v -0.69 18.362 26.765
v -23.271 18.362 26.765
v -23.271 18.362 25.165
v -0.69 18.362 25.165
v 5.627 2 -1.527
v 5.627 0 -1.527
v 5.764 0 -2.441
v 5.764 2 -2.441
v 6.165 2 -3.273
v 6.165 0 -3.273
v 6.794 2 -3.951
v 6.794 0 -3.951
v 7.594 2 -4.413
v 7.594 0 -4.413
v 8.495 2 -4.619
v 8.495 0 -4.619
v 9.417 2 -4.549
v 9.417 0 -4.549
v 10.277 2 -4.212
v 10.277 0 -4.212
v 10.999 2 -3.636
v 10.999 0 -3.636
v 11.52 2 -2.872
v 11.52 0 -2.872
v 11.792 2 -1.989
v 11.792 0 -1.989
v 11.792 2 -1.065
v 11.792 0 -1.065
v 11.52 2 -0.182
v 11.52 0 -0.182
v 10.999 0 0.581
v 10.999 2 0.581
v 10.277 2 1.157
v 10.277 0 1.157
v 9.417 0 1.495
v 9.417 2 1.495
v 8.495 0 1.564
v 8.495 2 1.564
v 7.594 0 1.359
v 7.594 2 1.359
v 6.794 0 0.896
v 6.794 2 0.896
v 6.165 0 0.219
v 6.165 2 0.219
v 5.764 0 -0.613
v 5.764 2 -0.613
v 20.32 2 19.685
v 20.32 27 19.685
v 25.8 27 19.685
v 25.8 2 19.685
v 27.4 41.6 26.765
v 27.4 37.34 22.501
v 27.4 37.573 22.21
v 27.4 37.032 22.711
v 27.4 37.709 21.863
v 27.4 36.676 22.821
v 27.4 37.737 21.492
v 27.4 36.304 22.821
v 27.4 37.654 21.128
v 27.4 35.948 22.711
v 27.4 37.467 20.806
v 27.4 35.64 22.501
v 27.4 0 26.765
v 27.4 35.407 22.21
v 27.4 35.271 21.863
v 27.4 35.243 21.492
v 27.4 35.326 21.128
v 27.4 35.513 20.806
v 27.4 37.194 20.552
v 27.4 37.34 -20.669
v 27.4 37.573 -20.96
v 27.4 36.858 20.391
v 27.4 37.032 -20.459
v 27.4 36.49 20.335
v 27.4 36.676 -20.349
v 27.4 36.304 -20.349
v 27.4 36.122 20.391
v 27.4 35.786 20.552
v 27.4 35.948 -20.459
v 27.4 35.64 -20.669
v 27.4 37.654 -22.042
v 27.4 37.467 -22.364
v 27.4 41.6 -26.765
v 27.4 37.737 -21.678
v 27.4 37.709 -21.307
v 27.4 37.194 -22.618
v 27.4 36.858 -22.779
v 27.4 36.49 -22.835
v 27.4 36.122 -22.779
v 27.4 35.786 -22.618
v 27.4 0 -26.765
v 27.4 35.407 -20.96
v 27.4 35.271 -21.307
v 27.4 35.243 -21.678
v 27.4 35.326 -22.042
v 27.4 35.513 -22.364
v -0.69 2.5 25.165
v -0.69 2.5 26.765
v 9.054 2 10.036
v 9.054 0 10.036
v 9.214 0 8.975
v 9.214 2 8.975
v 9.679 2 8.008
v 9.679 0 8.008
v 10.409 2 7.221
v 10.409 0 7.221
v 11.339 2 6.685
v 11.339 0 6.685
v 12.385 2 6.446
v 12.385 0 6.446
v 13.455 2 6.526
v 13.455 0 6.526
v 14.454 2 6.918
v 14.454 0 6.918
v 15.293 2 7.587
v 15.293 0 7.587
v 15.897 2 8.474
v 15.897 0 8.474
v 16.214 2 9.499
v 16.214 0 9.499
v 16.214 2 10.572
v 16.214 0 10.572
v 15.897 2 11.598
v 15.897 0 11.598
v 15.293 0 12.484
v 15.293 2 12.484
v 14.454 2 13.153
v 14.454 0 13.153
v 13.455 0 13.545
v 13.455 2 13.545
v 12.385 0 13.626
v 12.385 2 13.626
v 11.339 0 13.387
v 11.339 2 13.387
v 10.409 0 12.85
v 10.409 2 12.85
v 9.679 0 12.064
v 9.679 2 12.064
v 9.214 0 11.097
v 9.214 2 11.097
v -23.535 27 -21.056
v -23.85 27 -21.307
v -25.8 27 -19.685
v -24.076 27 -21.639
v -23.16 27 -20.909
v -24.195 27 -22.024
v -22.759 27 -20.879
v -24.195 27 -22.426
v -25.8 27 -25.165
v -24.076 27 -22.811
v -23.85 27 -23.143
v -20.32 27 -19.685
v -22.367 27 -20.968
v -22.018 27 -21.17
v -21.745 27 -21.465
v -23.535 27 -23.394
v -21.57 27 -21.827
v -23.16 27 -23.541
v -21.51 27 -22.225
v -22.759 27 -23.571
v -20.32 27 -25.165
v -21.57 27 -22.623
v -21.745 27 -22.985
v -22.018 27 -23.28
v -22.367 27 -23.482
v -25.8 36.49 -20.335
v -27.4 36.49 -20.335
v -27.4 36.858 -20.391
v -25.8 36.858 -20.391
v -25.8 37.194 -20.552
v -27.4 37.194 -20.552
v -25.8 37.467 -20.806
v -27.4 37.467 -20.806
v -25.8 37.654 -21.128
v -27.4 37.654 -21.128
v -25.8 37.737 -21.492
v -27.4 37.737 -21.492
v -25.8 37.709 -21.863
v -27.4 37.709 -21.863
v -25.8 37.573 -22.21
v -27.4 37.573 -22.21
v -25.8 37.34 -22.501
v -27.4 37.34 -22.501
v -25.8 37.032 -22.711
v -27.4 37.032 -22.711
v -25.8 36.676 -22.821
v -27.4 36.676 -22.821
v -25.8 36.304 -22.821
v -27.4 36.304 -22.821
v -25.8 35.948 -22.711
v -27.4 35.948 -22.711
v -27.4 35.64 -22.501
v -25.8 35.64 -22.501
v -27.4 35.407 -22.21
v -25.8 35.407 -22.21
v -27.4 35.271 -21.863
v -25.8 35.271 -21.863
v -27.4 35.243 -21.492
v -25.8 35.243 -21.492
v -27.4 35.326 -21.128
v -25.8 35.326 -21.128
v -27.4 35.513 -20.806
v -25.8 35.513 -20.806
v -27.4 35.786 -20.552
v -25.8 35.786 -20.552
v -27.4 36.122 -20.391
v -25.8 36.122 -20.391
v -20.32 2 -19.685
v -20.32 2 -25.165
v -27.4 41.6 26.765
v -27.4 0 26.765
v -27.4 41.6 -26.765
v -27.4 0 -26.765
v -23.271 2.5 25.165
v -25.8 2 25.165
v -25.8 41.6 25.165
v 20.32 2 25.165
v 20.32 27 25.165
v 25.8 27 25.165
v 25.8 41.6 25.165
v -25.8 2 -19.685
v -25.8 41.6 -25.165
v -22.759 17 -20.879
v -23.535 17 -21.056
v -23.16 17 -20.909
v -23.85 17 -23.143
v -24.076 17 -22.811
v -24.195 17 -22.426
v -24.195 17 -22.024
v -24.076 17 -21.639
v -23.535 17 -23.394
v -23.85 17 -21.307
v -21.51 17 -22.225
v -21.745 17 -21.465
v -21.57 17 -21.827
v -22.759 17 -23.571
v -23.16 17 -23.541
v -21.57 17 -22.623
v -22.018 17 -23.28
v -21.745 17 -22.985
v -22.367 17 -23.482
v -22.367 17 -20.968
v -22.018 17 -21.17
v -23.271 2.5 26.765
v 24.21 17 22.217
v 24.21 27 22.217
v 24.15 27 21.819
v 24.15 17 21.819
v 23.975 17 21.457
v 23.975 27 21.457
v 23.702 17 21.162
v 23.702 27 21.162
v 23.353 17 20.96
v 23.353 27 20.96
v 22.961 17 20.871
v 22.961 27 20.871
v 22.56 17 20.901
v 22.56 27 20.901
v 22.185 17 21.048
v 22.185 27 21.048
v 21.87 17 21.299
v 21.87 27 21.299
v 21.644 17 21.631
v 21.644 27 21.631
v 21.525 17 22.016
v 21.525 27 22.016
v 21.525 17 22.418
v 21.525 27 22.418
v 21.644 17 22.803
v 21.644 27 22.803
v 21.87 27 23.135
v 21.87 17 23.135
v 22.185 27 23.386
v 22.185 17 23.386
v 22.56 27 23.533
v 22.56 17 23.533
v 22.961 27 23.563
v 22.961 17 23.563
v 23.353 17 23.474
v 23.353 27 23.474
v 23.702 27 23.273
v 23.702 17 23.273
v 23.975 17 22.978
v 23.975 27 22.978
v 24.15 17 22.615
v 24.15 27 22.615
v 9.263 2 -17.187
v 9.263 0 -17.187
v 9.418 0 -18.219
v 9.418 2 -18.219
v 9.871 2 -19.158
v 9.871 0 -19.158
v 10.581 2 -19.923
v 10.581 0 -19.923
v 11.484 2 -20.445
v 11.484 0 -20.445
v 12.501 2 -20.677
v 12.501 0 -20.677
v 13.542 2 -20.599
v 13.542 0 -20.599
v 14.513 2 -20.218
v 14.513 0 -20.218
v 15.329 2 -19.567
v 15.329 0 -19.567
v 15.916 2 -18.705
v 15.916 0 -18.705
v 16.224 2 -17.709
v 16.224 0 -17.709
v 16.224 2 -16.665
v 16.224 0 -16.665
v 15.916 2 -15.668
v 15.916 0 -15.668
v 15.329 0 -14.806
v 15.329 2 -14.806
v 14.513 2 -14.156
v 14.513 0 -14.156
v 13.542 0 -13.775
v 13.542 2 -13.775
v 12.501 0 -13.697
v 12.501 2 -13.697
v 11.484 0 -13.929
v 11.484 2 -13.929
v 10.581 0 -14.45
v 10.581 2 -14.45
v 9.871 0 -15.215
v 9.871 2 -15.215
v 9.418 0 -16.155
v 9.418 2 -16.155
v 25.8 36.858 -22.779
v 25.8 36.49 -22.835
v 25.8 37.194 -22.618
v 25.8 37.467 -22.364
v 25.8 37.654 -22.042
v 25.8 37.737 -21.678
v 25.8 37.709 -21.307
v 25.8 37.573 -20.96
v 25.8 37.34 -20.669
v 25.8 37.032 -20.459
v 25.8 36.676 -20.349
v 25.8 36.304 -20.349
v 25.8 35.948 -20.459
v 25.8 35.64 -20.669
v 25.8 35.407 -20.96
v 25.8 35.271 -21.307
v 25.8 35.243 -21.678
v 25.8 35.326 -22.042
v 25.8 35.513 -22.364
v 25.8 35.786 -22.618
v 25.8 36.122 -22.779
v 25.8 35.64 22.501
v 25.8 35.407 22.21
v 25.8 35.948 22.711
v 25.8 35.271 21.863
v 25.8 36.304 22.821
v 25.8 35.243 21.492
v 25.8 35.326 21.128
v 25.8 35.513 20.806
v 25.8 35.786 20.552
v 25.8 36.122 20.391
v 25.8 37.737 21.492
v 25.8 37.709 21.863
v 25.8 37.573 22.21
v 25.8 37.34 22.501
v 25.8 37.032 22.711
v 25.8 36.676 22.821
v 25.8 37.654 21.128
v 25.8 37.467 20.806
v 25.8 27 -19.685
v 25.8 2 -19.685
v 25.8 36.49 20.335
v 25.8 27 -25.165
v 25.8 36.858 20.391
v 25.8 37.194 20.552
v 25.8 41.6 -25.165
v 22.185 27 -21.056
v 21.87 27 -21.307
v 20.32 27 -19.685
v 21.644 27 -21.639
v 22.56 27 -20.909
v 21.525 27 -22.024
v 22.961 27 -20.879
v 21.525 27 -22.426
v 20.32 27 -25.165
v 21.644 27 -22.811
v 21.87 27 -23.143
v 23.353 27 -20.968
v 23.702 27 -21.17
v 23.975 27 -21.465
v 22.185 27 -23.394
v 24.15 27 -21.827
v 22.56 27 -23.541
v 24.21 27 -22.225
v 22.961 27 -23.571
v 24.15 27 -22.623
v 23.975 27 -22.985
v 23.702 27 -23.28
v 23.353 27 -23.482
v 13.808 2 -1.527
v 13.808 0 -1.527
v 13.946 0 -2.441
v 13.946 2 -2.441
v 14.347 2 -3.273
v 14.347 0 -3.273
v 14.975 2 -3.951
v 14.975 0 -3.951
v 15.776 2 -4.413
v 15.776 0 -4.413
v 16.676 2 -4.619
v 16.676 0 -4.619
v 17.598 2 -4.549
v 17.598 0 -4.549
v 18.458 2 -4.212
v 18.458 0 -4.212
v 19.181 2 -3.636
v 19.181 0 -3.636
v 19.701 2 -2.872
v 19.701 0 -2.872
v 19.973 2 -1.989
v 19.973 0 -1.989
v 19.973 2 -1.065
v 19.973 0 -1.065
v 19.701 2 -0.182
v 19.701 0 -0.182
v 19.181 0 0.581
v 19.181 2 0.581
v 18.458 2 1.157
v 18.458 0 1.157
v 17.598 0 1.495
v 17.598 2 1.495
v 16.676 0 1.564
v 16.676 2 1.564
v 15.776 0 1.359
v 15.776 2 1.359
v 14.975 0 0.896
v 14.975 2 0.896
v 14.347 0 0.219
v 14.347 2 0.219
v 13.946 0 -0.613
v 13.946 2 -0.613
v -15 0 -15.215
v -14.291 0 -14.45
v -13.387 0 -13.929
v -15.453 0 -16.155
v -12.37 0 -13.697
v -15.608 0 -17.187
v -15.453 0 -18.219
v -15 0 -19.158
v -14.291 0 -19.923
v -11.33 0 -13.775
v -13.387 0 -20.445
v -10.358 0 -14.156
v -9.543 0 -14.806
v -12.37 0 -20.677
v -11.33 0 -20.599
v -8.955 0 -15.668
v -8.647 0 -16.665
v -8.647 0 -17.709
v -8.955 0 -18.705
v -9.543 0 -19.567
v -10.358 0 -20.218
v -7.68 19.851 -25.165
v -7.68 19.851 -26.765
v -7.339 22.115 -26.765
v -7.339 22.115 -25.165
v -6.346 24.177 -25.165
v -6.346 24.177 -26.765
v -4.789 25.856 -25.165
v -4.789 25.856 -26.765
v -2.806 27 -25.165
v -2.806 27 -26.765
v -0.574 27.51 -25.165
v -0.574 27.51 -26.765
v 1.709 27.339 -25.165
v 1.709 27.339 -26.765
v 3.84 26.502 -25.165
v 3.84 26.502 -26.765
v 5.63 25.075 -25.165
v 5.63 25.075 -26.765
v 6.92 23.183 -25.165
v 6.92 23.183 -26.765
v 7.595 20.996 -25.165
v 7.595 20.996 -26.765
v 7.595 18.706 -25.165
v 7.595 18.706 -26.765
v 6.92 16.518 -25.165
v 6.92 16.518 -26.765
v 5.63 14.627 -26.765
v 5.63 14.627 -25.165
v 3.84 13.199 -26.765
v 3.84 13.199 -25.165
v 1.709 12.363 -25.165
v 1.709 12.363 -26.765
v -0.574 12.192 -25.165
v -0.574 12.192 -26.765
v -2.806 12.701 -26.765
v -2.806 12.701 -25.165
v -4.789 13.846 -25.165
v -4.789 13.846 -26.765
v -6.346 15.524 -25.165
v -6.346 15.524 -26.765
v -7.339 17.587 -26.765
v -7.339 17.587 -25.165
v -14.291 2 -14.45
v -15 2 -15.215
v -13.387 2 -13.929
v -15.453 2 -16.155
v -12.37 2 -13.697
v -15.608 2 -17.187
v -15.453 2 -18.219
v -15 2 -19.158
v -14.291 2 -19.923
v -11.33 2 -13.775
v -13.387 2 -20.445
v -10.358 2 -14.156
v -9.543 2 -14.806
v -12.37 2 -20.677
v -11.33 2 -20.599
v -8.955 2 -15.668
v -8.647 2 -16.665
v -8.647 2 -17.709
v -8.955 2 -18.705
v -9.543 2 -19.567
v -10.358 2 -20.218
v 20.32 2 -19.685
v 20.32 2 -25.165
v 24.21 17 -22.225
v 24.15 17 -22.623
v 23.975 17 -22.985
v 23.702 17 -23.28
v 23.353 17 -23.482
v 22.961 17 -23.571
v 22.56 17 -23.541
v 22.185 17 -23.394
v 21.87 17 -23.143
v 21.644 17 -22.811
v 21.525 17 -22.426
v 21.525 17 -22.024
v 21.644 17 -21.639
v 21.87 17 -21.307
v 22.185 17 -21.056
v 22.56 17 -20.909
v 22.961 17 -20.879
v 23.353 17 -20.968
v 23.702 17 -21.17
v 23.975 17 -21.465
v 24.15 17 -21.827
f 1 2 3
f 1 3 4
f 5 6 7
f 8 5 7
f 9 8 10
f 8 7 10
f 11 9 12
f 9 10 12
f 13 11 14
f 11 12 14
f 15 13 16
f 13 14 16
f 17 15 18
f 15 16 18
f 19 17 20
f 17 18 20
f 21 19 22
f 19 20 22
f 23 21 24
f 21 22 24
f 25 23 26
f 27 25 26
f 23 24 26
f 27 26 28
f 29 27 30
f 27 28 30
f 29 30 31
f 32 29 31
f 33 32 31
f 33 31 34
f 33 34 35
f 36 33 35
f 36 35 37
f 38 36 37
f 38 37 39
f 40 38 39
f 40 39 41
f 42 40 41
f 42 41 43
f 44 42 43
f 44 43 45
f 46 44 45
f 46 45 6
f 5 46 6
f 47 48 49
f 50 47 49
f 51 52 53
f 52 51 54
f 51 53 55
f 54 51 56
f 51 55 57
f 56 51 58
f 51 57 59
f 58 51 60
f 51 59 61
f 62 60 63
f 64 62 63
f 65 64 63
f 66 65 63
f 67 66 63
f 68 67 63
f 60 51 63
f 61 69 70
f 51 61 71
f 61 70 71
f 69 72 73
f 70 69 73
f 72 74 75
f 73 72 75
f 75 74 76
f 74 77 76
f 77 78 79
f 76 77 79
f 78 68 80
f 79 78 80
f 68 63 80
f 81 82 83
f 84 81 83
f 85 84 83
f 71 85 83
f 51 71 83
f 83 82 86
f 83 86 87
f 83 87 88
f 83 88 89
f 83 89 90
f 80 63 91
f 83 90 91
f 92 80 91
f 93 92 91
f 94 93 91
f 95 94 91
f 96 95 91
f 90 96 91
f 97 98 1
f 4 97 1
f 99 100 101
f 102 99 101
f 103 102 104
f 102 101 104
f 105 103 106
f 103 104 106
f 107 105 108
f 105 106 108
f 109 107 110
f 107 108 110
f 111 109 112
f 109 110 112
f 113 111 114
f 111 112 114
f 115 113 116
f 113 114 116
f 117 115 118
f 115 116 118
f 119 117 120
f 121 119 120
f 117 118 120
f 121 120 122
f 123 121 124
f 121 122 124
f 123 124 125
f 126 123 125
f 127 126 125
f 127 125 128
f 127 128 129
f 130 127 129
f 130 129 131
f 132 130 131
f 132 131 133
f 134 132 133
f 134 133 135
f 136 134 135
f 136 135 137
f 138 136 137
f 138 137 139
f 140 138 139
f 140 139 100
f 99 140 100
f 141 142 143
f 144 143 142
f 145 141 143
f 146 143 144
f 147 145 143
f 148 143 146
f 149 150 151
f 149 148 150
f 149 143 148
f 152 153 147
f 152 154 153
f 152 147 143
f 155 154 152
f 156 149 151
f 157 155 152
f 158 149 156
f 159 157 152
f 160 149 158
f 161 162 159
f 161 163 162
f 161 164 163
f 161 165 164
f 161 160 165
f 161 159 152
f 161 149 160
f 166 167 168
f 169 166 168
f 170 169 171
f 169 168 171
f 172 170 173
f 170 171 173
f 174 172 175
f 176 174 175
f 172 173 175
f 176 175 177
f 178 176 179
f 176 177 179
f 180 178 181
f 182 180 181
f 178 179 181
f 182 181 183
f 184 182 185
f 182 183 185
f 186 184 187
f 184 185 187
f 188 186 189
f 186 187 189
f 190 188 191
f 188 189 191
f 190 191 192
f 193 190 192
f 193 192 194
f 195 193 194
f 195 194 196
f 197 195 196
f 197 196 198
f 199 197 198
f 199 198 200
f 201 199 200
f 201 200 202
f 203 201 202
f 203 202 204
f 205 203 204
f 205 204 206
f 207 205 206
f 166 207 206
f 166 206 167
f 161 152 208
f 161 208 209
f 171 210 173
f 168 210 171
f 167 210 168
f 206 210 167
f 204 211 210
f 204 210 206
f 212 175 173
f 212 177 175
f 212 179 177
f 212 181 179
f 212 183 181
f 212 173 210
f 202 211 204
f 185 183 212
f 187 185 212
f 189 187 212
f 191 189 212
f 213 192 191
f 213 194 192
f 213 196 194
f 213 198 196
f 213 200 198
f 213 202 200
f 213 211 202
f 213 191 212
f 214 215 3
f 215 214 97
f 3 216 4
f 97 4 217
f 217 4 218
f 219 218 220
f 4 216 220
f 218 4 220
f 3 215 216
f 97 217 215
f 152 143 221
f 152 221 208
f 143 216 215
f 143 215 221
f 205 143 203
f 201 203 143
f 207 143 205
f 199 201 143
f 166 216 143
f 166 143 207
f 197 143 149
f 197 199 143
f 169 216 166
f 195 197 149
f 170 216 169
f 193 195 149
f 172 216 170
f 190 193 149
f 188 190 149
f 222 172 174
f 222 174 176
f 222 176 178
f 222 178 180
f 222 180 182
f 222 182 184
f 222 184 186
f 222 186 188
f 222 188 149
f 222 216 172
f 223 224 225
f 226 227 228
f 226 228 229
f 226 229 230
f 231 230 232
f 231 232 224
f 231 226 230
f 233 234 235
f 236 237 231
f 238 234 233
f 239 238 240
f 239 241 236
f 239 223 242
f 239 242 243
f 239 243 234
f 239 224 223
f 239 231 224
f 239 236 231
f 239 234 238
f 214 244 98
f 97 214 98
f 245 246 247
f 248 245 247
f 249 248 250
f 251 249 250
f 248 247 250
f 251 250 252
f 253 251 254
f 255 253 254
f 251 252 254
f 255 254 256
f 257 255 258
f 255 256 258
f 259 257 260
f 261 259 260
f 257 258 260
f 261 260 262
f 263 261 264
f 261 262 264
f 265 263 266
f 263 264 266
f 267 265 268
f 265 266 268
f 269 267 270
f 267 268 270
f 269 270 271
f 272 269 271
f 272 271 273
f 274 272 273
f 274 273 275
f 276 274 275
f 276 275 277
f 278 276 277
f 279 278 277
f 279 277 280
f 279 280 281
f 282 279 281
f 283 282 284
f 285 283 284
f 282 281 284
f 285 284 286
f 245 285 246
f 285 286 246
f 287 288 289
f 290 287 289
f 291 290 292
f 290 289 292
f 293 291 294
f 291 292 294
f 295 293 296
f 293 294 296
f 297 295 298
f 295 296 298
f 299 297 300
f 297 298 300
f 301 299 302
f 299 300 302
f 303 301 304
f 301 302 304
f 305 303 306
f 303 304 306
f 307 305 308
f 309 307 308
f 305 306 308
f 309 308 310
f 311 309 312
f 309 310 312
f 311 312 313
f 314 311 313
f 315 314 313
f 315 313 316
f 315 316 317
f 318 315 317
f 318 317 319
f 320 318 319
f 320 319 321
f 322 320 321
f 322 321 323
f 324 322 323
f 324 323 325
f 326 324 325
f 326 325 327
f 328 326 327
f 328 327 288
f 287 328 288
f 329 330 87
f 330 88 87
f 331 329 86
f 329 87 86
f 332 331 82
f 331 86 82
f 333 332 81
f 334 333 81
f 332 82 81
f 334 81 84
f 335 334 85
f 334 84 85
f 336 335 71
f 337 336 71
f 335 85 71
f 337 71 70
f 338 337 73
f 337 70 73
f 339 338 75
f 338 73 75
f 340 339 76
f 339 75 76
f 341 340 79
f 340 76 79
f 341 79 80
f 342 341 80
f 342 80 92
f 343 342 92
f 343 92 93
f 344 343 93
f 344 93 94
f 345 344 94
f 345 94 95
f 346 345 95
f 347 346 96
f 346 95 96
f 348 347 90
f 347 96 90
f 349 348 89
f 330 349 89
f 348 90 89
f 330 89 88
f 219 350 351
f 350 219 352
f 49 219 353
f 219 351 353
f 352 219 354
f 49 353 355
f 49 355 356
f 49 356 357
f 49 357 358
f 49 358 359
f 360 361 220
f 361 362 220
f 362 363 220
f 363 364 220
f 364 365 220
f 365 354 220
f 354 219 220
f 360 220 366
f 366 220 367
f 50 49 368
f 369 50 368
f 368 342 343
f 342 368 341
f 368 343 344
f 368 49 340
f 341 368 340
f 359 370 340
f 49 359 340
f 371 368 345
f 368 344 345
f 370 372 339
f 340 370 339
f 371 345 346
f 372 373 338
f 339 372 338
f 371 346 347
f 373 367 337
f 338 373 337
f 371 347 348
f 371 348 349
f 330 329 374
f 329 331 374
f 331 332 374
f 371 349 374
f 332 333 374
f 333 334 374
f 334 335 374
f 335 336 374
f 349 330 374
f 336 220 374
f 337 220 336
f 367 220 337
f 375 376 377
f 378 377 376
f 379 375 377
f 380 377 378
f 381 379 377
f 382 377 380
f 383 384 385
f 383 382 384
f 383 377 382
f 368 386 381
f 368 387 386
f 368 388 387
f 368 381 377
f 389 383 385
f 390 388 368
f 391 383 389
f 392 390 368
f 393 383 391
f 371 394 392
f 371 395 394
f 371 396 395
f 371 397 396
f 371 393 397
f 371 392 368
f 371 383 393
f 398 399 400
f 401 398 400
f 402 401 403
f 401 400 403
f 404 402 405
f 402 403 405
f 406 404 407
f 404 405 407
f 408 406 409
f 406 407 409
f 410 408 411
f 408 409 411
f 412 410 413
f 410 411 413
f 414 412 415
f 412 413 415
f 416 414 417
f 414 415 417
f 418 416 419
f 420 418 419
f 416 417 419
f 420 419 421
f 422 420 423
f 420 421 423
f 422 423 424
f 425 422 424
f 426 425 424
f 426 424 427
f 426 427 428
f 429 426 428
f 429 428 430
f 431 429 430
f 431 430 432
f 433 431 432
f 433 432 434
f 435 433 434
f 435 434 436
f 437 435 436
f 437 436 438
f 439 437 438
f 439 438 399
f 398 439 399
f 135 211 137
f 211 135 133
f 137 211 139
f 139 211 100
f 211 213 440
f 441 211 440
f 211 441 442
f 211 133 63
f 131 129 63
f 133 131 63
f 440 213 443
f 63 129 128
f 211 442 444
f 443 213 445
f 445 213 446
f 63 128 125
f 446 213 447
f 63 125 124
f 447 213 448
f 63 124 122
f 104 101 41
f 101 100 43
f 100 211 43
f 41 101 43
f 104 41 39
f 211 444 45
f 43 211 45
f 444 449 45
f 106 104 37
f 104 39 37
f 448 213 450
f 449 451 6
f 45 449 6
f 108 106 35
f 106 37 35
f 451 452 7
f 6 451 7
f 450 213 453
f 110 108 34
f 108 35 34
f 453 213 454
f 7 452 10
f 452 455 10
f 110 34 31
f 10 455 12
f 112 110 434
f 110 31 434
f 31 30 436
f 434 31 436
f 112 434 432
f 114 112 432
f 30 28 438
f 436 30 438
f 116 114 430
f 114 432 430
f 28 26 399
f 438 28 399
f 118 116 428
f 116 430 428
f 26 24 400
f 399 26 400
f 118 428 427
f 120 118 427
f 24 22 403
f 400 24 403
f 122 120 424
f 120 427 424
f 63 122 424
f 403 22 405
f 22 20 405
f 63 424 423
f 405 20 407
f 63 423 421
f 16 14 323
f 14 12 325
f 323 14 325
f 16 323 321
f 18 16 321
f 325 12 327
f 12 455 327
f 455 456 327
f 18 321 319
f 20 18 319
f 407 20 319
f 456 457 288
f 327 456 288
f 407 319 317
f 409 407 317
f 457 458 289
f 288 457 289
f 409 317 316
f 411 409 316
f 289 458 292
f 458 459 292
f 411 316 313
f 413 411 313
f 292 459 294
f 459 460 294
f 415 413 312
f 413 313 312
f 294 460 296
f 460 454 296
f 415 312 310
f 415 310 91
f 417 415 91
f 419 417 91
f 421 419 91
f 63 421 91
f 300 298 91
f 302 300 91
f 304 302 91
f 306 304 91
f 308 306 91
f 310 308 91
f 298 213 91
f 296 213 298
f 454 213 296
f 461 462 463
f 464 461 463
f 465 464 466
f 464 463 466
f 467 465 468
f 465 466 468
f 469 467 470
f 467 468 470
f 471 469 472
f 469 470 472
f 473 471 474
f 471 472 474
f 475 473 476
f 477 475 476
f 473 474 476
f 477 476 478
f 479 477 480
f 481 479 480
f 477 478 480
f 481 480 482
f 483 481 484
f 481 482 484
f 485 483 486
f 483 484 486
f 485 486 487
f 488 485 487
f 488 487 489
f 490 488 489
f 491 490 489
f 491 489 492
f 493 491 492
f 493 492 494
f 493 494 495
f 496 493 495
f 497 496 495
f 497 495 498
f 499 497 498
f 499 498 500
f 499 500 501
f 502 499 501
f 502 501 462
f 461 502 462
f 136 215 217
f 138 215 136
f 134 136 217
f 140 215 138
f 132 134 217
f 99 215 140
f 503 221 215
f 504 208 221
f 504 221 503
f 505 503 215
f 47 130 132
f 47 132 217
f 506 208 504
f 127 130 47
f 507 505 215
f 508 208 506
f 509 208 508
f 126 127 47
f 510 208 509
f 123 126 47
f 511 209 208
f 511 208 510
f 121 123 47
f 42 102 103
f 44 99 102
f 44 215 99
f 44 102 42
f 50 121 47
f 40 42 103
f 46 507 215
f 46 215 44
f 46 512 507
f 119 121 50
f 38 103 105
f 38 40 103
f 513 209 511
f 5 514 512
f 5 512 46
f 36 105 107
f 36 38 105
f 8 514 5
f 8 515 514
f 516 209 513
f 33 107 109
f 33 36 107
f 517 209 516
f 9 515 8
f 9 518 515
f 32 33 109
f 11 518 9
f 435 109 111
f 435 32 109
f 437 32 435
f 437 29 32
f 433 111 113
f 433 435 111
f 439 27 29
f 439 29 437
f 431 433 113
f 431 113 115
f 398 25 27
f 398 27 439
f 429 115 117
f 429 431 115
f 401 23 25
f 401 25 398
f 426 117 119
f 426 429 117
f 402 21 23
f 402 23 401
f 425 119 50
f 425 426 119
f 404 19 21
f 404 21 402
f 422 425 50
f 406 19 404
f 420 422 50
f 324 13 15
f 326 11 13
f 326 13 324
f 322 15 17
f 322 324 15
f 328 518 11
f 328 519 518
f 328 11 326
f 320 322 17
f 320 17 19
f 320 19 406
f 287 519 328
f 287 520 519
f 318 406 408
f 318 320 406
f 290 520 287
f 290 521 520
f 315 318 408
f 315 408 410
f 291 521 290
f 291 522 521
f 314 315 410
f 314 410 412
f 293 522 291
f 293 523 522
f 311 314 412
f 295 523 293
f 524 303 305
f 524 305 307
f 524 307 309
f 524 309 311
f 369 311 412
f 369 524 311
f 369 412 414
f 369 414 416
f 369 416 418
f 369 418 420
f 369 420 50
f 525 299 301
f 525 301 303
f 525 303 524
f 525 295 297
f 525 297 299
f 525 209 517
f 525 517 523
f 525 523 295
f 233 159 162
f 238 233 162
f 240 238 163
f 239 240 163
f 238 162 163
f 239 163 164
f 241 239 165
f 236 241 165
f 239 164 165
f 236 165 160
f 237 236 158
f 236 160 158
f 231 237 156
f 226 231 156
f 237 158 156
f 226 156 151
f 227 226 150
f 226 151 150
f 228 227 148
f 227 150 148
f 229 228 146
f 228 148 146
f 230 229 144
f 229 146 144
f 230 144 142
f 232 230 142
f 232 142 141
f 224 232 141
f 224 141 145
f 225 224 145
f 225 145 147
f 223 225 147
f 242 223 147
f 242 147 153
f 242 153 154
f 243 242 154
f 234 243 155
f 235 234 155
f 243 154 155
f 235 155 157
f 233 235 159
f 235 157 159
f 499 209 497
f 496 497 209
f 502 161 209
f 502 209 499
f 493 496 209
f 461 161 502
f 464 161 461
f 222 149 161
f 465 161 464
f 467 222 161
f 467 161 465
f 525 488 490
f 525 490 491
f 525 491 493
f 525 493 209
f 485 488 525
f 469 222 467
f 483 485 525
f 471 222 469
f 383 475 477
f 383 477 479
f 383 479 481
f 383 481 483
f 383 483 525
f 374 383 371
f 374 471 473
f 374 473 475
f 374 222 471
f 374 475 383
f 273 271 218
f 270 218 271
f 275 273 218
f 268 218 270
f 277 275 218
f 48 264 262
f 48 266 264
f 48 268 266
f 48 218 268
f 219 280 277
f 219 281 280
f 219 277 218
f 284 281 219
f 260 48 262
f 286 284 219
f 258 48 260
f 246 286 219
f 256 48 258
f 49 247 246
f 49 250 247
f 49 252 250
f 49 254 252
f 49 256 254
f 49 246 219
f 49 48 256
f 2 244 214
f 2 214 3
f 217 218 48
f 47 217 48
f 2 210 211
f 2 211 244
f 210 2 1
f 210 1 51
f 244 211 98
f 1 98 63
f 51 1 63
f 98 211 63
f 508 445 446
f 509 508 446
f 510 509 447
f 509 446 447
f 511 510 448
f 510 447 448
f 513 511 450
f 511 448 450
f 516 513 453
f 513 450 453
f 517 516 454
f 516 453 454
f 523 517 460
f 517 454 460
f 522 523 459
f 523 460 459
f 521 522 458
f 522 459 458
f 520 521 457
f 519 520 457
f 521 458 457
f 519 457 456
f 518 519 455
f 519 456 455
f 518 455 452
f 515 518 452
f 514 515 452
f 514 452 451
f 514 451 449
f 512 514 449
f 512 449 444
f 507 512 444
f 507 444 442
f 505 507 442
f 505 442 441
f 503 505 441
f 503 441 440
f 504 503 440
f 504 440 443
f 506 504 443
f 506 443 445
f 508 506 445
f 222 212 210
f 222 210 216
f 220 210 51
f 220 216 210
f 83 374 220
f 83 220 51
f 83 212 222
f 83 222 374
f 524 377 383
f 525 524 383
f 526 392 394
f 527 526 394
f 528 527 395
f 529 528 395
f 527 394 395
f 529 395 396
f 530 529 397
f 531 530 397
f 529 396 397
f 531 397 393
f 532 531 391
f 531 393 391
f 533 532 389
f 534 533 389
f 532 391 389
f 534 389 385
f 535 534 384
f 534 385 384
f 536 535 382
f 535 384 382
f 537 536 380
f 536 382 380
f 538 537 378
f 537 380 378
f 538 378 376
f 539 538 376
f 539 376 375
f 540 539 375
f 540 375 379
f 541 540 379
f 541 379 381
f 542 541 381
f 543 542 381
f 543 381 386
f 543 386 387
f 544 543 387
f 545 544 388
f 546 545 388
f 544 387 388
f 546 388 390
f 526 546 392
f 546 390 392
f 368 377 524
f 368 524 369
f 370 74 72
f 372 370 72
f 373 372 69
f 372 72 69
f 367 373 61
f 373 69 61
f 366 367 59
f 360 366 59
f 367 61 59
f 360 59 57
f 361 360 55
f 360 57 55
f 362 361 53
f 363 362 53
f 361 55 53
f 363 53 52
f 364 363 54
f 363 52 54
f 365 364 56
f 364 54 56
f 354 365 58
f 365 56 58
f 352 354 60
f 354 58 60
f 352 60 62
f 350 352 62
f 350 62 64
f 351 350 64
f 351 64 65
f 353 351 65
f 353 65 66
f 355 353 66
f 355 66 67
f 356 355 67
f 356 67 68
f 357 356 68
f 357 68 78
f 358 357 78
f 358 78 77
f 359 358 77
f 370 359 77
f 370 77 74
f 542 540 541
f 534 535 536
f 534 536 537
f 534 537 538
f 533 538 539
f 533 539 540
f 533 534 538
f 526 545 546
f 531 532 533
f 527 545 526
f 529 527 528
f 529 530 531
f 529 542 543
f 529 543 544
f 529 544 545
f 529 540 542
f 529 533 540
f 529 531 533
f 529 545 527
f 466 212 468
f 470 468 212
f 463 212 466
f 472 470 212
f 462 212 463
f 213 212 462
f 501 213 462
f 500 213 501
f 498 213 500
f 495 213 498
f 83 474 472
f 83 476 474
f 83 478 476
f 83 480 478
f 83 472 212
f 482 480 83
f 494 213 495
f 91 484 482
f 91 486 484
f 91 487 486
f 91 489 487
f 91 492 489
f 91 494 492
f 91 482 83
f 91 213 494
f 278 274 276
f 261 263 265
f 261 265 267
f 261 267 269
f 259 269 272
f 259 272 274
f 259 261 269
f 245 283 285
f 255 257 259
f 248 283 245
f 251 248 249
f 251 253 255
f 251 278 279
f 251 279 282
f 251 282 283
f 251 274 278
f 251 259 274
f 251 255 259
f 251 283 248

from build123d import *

# Parameters (mm, degrees)
SKETCH1_W           = 54.8
SKETCH1_H           = 53.53
BOSS_EXTRUDE1_DEPTH = 41.6
SKETCH2_W           = 51.6
SKETCH2_H           = 50.33
CUT_EXTRUDE1_DEPTH  = 39.6
SKETCH3_W           = 5.48
SKETCH3_H           = 5.48
BOSS_EXTRUDE2_DEPTH = 25
SKETCH4_R           = 1.35
CUT_EXTRUDE2_DEPTH  = 10
CUT_EXTRUDE3_REACH  = 43.6
SKETCH5_R           = 3.5
CUT_EXTRUDE4_REACH  = 43.6
SKETCH6_R           = 3.1
CUT_EXTRUDE5_REACH  = 43.6
SKETCH7_R           = 3.6
CUT_EXTRUDE6_REACH  = 56.8
SKETCH8_R           = 1.25
CUT_EXTRUDE7_REACH  = 56.8
SKETCH10_R          = 1.25
CUT_EXTRUDE8_REACH  = 55.53
SKETCH12_R          = 7.680495542
CUT_EXTRUDE9_REACH  = 55.53
SKETCH13_W          = 22.581735489
SKETCH13_H          = 15.862362247
CUT_EXTRUDE10_REACH = 56.8
SKETCH14_R          = 1.25


with BuildPart() as part:
    # Sketch1 → Boss-Extrude1 (new body)
    with BuildSketch(Plane(origin=(0, 0, 0), x_dir=(1, 0, 0), z_dir=(0, 1, 0))):
        Rectangle(SKETCH1_W, SKETCH1_H)
    extrude(amount=BOSS_EXTRUDE1_DEPTH)

    # Sketch2 → Cut-Extrude1 (cut)
    with BuildSketch(Plane(origin=(0, 41.6, 0), x_dir=(1, 0, 0), z_dir=(0, 1, 0))):
        Rectangle(SKETCH2_W, SKETCH2_H)
    extrude(amount=-CUT_EXTRUDE1_DEPTH, mode=Mode.SUBTRACT)

    # Sketch3 → Boss-Extrude2 (add)
    with BuildSketch(Plane(origin=(0, 2, 0), x_dir=(1, 0, 0), z_dir=(0, 1, 0))):
        with Locations((-23.06, 22.425)):
            Rectangle(SKETCH3_W, SKETCH3_H)
        with Locations((23.06, 22.425)):
            Rectangle(SKETCH3_W, SKETCH3_H)
        with Locations((23.06, -22.425)):
            Rectangle(SKETCH3_W, SKETCH3_H)
    extrude(amount=BOSS_EXTRUDE2_DEPTH)

    # Sketch4 → Cut-Extrude2 (cut)
    with BuildSketch(Plane(origin=(0, 27, 0), x_dir=(1, 0, 0), z_dir=(0, 1, 0))):
        with Locations((-22.86, 22.225)):
            Circle(SKETCH4_R)
        with Locations((22.86, 22.225)):
            Circle(SKETCH4_R)
        with Locations((22.86, -22.217113742)):
            Circle(SKETCH4_R)
    extrude(amount=-CUT_EXTRUDE2_DEPTH, mode=Mode.SUBTRACT)

    # Sketch5 → Cut-Extrude3 (cut, up to next)
    with BuildSketch(Plane(origin=(0, 0, 0), x_dir=(-1, 0, 0), z_dir=(0, -1, 0)), mode=Mode.PRIVATE) as cut_extrude3_sk1:
        with Locations((-12.762863618, 17.186859774)):
            Circle(SKETCH5_R)
    cut_extrude3_tool1 = extrude(cut_extrude3_sk1.sketch, amount=-CUT_EXTRUDE3_REACH, mode=Mode.PRIVATE) & part.part
    add(cut_extrude3_tool1.solids().sort_by_distance((12.762864, 0, -17.18686))[0], mode=Mode.SUBTRACT)
    # Sketch5 → Cut-Extrude3 (cut, up to next)
    with BuildSketch(Plane(origin=(0, 0, 0), x_dir=(-1, 0, 0), z_dir=(0, -1, 0)), mode=Mode.PRIVATE) as cut_extrude3_sk2:
        with Locations((12.108357792, 17.186859774)):
            Circle(SKETCH5_R)
    cut_extrude3_tool2 = extrude(cut_extrude3_sk2.sketch, amount=-CUT_EXTRUDE3_REACH, mode=Mode.PRIVATE) & part.part
    add(cut_extrude3_tool2.solids().sort_by_distance((-12.108358, 0, -17.18686))[0], mode=Mode.SUBTRACT)

    # Sketch6 → Cut-Extrude4 (cut, up to next)
    with BuildSketch(Plane(origin=(0, 0, 0), x_dir=(-1, 0, 0), z_dir=(0, -1, 0)), mode=Mode.PRIVATE) as cut_extrude4_sk1:
        with Locations((-16.908067186, 1.527180262)):
            Circle(SKETCH6_R)
    cut_extrude4_tool1 = extrude(cut_extrude4_sk1.sketch, amount=-CUT_EXTRUDE4_REACH, mode=Mode.PRIVATE) & part.part
    add(cut_extrude4_tool1.solids().sort_by_distance((16.908067, 0, -1.52718))[0], mode=Mode.SUBTRACT)
    # Sketch6 → Cut-Extrude4 (cut, up to next)
    with BuildSketch(Plane(origin=(0, 0, 0), x_dir=(-1, 0, 0), z_dir=(0, -1, 0)), mode=Mode.PRIVATE) as cut_extrude4_sk2:
        with Locations((-8.726744354, 1.527180262)):
            Circle(SKETCH6_R)
    cut_extrude4_tool2 = extrude(cut_extrude4_sk2.sketch, amount=-CUT_EXTRUDE4_REACH, mode=Mode.PRIVATE) & part.part
    add(cut_extrude4_tool2.solids().sort_by_distance((8.726744, 0, -1.52718))[0], mode=Mode.SUBTRACT)

    # Sketch7 → Cut-Extrude5 (cut, up to next)
    with BuildSketch(Plane(origin=(0, 0, 0), x_dir=(-1, 0, 0), z_dir=(0, -1, 0)), mode=Mode.PRIVATE) as cut_extrude5_sk1:
        with Locations((-12.653779314, -10.035756007)):
            Circle(SKETCH7_R)
    cut_extrude5_tool1 = extrude(cut_extrude5_sk1.sketch, amount=-CUT_EXTRUDE5_REACH, mode=Mode.PRIVATE) & part.part
    add(cut_extrude5_tool1.solids().sort_by_distance((12.653779, 0, 10.035756))[0], mode=Mode.SUBTRACT)

    # Sketch8 → Cut-Extrude6 (cut, up to next)
    with BuildSketch(Plane(origin=(27.4, 0, 0), x_dir=(0, 0, -1), z_dir=(1, 0, 0)), mode=Mode.PRIVATE) as cut_extrude6_sk1:
        with Locations((-21.585, 36.49)):
            Circle(SKETCH8_R)
    cut_extrude6_tool1 = extrude(cut_extrude6_sk1.sketch, amount=-CUT_EXTRUDE6_REACH, mode=Mode.PRIVATE) & part.part
    add(cut_extrude6_tool1.solids().sort_by_distance((27.4, 36.49, 21.585))[0], mode=Mode.SUBTRACT)

    # Sketch10 → Cut-Extrude7 (cut, up to next)
    with BuildSketch(Plane.ZY.offset(27.4), mode=Mode.PRIVATE) as cut_extrude7_sk1:
        with Locations((-21.585, 36.49)):
            Circle(SKETCH10_R)
    cut_extrude7_tool1 = extrude(cut_extrude7_sk1.sketch, amount=-CUT_EXTRUDE7_REACH, mode=Mode.PRIVATE) & part.part
    add(cut_extrude7_tool1.solids().sort_by_distance((-27.4, 36.49, -21.585))[0], mode=Mode.SUBTRACT)

    # Sketch12 → Cut-Extrude8 (cut, up to next)
    with BuildSketch(Plane(origin=(0, 0, -26.765), x_dir=(-1, 0, 0), z_dir=(0, 0, -1)), mode=Mode.PRIVATE) as cut_extrude8_sk1:
        with Locations((0, 19.850785186)):
            Circle(SKETCH12_R)
    cut_extrude8_tool1 = extrude(cut_extrude8_sk1.sketch, amount=-CUT_EXTRUDE8_REACH, mode=Mode.PRIVATE) & part.part
    add(cut_extrude8_tool1.solids().sort_by_distance((0, 19.850785, -26.765))[0], mode=Mode.SUBTRACT)

    # Sketch13 → Cut-Extrude9 (cut, up to next)
    with BuildSketch(Plane.XY.offset(26.765), mode=Mode.PRIVATE) as cut_extrude9_sk1:
        with Locations((-11.980612505, 10.431181124)):
            Rectangle(SKETCH13_W, SKETCH13_H)
    cut_extrude9_tool1 = extrude(cut_extrude9_sk1.sketch, amount=-CUT_EXTRUDE9_REACH, mode=Mode.PRIVATE) & part.part
    add(cut_extrude9_tool1.solids().sort_by_distance((-11.980613, 10.431181, 26.765))[0], mode=Mode.SUBTRACT)

    # Sketch14 → Cut-Extrude10 (cut, up to next)
    with BuildSketch(Plane(origin=(27.4, 0, 0), x_dir=(0, 0, -1), z_dir=(1, 0, 0)), mode=Mode.PRIVATE) as cut_extrude10_sk1:
        with Locations((21.585, 36.49)):
            Circle(SKETCH14_R)
    cut_extrude10_tool1 = extrude(cut_extrude10_sk1.sketch, amount=-CUT_EXTRUDE10_REACH, mode=Mode.PRIVATE) & part.part
    add(cut_extrude10_tool1.solids().sort_by_distance((27.4, 36.49, -21.585))[0], mode=Mode.SUBTRACT)


solid = part.part
